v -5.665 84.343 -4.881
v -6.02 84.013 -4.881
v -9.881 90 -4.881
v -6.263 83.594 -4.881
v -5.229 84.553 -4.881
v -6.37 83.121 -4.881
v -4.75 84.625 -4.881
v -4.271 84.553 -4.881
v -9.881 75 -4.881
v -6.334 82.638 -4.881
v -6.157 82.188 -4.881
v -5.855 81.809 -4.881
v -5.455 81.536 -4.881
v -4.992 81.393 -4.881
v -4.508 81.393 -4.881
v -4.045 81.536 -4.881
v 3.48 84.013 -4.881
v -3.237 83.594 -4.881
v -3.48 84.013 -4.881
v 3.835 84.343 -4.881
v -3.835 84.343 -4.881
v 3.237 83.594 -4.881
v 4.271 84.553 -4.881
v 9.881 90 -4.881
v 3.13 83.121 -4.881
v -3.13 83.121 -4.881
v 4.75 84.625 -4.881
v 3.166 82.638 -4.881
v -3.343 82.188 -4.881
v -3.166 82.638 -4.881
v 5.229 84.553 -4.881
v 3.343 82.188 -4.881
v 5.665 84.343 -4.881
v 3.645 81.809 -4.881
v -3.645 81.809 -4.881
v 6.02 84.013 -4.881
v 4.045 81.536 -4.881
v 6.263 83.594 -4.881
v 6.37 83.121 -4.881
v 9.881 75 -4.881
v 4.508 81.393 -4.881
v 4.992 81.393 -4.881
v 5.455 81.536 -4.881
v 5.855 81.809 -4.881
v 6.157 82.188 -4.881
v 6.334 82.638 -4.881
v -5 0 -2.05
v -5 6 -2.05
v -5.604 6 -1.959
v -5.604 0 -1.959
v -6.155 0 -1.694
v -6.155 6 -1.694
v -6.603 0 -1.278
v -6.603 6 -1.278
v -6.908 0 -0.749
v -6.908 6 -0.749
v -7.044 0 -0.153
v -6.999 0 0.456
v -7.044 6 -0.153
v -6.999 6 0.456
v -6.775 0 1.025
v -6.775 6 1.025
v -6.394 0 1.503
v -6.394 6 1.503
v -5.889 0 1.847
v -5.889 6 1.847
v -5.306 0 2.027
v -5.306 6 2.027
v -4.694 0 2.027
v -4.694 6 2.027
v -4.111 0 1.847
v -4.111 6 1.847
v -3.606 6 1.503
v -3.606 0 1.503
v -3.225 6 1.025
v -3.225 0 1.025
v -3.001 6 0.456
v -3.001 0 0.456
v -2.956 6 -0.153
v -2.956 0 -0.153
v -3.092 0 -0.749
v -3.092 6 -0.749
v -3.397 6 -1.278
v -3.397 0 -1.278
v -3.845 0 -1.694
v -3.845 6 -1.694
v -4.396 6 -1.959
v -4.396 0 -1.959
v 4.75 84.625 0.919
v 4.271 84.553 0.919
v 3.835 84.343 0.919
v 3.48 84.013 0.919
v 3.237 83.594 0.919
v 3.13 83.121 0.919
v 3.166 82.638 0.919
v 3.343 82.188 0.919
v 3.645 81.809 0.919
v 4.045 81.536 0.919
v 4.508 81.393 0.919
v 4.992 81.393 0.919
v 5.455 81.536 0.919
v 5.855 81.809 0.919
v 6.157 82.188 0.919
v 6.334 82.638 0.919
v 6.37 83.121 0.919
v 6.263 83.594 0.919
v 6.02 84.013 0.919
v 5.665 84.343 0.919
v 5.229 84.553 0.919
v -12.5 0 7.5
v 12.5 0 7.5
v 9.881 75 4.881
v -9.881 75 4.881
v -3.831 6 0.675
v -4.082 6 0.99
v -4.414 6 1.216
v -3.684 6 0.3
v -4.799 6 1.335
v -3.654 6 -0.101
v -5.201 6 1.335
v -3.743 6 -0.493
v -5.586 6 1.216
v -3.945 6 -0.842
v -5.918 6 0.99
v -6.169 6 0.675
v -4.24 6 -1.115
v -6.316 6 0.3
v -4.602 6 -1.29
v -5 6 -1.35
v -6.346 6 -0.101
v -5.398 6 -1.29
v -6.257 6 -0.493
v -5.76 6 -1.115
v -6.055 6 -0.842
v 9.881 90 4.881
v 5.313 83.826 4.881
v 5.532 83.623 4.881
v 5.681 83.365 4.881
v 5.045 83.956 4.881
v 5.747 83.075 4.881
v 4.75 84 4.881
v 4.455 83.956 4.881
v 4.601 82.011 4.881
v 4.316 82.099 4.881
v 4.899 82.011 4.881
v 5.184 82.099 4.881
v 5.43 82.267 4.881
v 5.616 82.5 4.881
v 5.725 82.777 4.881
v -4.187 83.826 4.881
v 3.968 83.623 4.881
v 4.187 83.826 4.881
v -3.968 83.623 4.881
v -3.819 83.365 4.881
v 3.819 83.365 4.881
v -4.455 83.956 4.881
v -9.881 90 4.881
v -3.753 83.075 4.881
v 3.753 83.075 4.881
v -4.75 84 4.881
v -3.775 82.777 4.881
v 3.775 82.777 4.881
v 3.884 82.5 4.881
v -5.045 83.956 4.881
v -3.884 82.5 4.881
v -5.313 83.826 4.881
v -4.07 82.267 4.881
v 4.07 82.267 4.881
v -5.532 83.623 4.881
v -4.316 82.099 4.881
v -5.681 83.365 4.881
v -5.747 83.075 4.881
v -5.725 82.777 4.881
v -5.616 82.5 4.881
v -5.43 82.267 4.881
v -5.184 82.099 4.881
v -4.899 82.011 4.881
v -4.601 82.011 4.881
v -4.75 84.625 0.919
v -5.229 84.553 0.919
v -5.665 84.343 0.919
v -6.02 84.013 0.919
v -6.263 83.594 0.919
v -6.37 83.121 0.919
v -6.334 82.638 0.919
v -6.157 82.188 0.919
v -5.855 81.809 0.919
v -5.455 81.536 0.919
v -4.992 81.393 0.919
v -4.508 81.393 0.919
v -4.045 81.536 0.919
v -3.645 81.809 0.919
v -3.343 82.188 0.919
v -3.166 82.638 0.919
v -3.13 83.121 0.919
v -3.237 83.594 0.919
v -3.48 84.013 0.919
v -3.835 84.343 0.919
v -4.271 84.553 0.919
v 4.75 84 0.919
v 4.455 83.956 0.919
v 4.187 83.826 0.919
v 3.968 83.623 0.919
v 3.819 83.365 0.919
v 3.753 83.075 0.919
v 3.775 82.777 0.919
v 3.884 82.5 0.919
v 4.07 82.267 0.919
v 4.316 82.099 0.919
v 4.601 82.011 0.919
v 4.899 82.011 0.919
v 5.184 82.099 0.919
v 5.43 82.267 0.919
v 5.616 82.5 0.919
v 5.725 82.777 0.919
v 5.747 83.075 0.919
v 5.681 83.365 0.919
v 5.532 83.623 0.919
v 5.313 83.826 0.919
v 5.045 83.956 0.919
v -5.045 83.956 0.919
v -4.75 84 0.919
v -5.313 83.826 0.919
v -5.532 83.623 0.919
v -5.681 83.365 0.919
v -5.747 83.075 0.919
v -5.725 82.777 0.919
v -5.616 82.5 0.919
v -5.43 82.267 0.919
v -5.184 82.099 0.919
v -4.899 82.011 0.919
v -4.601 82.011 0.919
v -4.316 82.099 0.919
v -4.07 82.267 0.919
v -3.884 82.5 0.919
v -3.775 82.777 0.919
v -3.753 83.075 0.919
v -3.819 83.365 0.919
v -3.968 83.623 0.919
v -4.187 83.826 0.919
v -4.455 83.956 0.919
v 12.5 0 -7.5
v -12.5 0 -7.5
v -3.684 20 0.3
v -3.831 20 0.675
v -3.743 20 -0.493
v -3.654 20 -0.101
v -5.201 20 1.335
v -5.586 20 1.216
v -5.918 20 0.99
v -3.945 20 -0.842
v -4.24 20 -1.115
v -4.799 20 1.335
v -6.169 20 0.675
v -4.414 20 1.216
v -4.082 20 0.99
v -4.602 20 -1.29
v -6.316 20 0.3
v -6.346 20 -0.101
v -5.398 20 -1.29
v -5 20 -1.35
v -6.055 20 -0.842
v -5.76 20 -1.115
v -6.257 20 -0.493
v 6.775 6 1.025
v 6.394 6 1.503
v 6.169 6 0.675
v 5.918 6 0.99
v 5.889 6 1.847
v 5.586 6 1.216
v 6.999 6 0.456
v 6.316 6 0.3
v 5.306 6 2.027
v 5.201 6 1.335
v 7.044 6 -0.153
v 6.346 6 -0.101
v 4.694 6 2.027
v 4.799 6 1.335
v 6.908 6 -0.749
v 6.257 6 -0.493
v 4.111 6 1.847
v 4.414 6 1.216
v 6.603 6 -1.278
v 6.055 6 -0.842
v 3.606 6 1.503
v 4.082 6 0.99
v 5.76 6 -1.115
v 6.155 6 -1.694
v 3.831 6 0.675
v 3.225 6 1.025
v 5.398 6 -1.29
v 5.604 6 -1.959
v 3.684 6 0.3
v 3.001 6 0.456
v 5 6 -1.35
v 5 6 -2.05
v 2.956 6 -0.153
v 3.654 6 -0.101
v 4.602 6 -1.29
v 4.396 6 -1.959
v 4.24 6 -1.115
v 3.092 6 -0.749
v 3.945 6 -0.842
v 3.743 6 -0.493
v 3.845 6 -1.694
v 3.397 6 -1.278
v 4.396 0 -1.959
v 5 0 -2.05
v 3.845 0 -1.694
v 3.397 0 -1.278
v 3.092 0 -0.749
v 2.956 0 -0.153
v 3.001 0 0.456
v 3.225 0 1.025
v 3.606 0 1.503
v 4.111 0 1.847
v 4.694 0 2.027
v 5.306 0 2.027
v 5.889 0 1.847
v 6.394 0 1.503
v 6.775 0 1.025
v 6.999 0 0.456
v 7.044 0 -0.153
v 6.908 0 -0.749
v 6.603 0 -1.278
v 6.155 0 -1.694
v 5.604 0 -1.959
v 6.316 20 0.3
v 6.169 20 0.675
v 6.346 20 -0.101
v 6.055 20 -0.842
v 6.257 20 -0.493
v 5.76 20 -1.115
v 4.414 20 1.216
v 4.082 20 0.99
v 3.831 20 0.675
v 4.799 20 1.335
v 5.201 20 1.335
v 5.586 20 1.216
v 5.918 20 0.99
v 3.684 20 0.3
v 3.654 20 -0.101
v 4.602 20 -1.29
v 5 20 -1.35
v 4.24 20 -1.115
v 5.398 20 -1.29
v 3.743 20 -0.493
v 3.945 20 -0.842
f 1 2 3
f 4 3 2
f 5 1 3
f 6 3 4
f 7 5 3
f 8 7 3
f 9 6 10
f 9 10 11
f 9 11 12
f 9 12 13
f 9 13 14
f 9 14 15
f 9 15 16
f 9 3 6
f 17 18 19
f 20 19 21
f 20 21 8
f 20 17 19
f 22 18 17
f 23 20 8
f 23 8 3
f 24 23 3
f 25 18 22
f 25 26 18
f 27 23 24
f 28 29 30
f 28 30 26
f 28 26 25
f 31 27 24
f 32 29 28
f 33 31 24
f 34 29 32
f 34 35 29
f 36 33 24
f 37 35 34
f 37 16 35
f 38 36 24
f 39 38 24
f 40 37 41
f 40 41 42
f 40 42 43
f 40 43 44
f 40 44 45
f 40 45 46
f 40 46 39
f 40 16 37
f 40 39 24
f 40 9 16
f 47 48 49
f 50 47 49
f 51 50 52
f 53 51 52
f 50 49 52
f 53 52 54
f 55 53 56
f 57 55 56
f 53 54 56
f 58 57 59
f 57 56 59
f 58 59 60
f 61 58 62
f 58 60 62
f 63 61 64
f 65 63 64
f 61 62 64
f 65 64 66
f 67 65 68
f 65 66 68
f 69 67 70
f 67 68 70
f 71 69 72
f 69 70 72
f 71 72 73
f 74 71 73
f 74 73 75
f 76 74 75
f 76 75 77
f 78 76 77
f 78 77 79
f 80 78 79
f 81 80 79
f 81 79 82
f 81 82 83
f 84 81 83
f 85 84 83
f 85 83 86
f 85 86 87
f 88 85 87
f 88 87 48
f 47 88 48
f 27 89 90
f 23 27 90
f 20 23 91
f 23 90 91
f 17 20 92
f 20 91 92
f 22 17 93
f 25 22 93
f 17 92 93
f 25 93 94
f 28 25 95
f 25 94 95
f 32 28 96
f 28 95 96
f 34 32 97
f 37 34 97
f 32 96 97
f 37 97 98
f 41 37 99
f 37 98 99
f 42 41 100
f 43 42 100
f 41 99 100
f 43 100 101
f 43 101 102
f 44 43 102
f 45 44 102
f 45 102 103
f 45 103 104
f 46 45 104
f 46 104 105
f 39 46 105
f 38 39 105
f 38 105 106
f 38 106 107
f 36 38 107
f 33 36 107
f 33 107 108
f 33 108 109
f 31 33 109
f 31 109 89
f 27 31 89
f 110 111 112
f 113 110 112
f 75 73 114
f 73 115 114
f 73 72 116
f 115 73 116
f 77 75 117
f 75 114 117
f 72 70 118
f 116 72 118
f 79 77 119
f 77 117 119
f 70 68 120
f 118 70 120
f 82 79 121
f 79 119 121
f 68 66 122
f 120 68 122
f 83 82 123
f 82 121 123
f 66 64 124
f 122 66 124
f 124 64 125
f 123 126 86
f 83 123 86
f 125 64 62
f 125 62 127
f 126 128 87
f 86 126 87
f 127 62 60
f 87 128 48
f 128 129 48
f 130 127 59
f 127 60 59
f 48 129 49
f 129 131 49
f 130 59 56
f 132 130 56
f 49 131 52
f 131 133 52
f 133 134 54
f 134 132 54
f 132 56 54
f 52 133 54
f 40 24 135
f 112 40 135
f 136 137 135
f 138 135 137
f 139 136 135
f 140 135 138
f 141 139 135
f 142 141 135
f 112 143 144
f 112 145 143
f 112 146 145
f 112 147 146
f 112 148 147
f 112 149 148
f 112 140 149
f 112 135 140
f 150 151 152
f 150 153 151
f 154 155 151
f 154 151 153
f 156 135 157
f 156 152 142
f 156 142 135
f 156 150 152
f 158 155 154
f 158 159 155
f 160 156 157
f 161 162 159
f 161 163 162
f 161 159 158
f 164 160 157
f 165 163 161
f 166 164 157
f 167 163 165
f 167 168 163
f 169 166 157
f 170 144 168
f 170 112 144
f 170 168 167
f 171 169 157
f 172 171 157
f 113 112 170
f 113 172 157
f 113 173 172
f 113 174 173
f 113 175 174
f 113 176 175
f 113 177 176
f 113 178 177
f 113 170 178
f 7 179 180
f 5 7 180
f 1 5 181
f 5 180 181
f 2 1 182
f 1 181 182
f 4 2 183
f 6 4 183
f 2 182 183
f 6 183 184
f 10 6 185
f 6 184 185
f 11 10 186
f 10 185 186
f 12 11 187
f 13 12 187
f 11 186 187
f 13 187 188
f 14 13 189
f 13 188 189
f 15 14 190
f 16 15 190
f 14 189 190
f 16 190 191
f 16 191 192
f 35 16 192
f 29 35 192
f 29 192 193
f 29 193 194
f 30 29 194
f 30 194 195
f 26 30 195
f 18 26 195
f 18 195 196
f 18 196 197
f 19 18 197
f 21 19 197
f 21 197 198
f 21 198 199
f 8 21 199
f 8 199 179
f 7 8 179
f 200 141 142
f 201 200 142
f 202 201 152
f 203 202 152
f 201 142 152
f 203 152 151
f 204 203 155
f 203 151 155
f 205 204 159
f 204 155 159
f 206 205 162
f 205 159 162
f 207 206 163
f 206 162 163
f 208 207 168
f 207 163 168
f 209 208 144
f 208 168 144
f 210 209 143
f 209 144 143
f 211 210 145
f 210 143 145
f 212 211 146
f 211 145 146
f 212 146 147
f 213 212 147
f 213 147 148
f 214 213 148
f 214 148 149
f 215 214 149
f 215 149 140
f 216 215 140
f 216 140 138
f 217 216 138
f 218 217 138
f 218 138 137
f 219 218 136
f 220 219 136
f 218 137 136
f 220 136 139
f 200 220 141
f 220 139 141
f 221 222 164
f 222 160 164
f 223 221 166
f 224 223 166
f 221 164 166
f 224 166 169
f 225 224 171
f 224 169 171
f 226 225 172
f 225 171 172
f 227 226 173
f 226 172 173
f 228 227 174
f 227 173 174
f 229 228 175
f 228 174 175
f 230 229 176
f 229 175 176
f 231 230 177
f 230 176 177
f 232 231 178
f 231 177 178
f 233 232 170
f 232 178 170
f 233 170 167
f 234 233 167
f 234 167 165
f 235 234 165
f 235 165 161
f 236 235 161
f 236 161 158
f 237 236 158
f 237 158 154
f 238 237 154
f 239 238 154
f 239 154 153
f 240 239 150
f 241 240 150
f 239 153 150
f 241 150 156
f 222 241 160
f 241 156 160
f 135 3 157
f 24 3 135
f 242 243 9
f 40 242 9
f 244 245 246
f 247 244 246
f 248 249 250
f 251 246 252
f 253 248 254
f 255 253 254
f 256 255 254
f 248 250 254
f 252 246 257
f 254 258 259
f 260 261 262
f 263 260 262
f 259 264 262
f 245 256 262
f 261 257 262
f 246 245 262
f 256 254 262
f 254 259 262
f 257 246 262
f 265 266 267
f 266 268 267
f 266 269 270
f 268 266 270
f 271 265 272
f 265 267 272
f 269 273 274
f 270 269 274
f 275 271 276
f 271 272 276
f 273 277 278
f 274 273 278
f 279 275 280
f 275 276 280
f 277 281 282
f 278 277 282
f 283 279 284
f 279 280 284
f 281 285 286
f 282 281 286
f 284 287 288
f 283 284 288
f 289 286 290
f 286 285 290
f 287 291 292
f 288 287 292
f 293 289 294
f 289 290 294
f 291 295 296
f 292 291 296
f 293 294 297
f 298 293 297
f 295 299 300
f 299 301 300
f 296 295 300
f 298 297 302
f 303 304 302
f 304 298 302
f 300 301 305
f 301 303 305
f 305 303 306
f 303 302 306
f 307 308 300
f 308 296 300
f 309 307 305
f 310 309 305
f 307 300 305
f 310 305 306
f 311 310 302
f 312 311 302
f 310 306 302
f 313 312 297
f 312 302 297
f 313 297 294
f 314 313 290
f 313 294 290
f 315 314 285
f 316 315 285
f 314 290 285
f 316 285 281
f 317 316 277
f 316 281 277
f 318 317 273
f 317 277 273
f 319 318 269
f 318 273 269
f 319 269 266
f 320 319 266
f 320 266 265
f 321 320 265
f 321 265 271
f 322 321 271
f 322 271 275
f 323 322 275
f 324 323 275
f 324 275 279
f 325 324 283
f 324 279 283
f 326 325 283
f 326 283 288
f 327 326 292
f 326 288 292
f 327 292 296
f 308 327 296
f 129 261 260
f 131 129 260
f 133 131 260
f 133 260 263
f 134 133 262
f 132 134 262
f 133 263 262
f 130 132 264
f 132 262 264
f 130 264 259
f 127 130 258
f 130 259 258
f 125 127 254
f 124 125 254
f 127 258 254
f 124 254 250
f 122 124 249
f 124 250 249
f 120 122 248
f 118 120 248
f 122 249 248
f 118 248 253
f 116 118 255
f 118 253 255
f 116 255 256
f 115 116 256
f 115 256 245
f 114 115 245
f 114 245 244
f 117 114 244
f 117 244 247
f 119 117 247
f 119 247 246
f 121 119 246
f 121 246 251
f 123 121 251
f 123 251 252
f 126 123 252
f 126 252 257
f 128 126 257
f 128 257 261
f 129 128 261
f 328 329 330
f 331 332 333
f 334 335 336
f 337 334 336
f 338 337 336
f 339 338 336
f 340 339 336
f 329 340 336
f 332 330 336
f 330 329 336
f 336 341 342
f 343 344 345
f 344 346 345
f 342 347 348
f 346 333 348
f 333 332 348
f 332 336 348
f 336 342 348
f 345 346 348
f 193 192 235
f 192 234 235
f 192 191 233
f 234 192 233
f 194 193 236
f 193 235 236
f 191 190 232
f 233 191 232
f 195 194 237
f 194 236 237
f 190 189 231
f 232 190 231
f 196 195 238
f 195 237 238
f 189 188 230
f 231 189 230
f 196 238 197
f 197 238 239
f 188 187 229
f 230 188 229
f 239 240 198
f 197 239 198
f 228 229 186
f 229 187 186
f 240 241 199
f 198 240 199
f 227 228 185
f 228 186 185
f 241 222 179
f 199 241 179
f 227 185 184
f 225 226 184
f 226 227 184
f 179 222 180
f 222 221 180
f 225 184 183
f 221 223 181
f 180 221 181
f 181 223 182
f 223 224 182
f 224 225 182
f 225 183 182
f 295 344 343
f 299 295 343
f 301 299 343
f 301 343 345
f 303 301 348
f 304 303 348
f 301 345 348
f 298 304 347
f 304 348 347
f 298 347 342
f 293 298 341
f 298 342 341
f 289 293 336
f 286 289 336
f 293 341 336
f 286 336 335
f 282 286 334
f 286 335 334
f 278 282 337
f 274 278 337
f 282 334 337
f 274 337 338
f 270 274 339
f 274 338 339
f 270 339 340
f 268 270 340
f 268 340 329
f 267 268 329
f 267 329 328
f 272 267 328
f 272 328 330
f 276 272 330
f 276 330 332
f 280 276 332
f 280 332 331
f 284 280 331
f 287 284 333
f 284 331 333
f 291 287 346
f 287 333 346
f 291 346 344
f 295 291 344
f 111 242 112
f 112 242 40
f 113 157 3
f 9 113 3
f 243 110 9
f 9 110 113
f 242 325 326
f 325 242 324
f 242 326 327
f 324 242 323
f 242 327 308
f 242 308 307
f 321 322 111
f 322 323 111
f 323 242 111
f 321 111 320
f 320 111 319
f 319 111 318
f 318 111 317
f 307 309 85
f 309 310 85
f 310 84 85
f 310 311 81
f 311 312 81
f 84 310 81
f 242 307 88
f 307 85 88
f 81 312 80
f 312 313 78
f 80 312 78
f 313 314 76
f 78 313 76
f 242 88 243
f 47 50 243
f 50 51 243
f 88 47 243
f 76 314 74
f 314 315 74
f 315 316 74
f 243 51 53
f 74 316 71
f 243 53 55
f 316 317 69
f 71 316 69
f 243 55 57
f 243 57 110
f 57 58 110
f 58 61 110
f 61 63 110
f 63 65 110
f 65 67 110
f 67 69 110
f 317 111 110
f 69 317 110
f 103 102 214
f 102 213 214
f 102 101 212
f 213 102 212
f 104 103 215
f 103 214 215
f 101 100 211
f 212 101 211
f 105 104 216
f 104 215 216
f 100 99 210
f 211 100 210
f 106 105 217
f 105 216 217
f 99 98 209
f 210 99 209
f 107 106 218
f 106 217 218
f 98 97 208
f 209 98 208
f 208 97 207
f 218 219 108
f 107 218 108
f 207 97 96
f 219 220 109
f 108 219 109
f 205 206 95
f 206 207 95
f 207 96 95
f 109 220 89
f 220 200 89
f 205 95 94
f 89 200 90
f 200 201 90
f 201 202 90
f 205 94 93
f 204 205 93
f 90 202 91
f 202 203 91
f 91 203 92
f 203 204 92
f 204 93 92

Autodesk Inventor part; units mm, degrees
ref_plane "YZ Plane" through (0, 0, 0) normal (1, 0, 0) x (0, 1, 0)
ref_plane "XZ Plane" through (0, 0, 0) normal (0, 1, 0) x (-1, 0, 0)
ref_plane "XY Plane" through (0, 0, 0) normal (0, 0, 1) x (1, 0, 0)
sketch "草圖1" plane through (0, 0, 0) normal (0, 1, 0) x (-1, 0, 0)
  line L0 (12.5, 7.5) -> (-12.5, 7.5)
  line L1 (-12.5, 7.5) -> (-12.5, -7.5)
  line L2 (-12.5, -7.5) -> (12.5, -7.5)
  line L3 (12.5, -7.5) -> (12.5, 7.5)
  line L4 (12.5, 7.5) -> (-12.5, -7.5) construction
  line L5 (-12.5, 7.5) -> (12.5, -7.5) construction
  point P0 (0, 0)
  dimension "d0" = 25
  dimension "d1" = 15
extrude "擠出1" add sketch "草圖1" along normal blind 75 draft -2
sketch "草圖2" plane through (0, 75, 0) normal (0, 1, 0) x (1, 0, 0)
  line L0 (9.8809, -4.8809) -> (-9.8809, -4.8809) projected
  line L1 (9.8809, 4.8809) -> (9.8809, -4.8809) projected
  line L2 (-9.8809, 4.8809) -> (9.8809, 4.8809) projected
  line L3 (-9.8809, -4.8809) -> (-9.8809, 4.8809) projected
  point P0 (0, 0)
extrude "擠出2" add sketch "草圖2" along normal blind 15
sketch "草圖3" plane through (9.8809, 75, -4.8809) normal (0, 0, -1) x (-1, 0, 0)
  line L0 (19.7619, 0) -> (0, 0) projected
  line L1 (19.7619, 0) -> (19.7619, 15) projected
  line L2 (0, 15) -> (19.7619, 15) projected
  line L3 (0, 0) -> (0, 15) projected
  line L4 (0, 15) -> (19.7619, 15) projected
  line L5 (5.1309, 15) -> (14.6309, 15)
  line L6 (14.6309, 15) -> (14.6309, 8)
  line L7 (14.6309, 8) -> (5.1309, 8)
  line L8 (5.1309, 8) -> (5.1309, 15)
  point P0 (9.8809, -75)
  point P1 (9.8809, 8)
  point P2 (9.8809, 15)
  dimension "d6" = 9.5
  dimension "d7" = 7
hole "孔1" at (4.75, 83, -4.8809) at (-4.75, 83, -4.8809) direction (0, 0, 1) diameter 2 end through all counterbore diameter 3.25 counterbore depth 5.8
sketch "草圖4" plane through (0, 0, 0) normal (0, -1, 0) x (1, 0, 0)
  point P0 (0, 0)
  point P1 (5, 0)
  point P2 (-5, 0)
  dimension "d15" = 10
  dimension "d16" = 5
hole "孔2" at (5, 0, 0) at (-5, 0, 0) direction (0, 1, 0) diameter 2.7 depth 20 counterbore diameter 4.1 counterbore depth 6
equation "\"d16\" = 0.5 * d15"
properties part number "限位開關架"
